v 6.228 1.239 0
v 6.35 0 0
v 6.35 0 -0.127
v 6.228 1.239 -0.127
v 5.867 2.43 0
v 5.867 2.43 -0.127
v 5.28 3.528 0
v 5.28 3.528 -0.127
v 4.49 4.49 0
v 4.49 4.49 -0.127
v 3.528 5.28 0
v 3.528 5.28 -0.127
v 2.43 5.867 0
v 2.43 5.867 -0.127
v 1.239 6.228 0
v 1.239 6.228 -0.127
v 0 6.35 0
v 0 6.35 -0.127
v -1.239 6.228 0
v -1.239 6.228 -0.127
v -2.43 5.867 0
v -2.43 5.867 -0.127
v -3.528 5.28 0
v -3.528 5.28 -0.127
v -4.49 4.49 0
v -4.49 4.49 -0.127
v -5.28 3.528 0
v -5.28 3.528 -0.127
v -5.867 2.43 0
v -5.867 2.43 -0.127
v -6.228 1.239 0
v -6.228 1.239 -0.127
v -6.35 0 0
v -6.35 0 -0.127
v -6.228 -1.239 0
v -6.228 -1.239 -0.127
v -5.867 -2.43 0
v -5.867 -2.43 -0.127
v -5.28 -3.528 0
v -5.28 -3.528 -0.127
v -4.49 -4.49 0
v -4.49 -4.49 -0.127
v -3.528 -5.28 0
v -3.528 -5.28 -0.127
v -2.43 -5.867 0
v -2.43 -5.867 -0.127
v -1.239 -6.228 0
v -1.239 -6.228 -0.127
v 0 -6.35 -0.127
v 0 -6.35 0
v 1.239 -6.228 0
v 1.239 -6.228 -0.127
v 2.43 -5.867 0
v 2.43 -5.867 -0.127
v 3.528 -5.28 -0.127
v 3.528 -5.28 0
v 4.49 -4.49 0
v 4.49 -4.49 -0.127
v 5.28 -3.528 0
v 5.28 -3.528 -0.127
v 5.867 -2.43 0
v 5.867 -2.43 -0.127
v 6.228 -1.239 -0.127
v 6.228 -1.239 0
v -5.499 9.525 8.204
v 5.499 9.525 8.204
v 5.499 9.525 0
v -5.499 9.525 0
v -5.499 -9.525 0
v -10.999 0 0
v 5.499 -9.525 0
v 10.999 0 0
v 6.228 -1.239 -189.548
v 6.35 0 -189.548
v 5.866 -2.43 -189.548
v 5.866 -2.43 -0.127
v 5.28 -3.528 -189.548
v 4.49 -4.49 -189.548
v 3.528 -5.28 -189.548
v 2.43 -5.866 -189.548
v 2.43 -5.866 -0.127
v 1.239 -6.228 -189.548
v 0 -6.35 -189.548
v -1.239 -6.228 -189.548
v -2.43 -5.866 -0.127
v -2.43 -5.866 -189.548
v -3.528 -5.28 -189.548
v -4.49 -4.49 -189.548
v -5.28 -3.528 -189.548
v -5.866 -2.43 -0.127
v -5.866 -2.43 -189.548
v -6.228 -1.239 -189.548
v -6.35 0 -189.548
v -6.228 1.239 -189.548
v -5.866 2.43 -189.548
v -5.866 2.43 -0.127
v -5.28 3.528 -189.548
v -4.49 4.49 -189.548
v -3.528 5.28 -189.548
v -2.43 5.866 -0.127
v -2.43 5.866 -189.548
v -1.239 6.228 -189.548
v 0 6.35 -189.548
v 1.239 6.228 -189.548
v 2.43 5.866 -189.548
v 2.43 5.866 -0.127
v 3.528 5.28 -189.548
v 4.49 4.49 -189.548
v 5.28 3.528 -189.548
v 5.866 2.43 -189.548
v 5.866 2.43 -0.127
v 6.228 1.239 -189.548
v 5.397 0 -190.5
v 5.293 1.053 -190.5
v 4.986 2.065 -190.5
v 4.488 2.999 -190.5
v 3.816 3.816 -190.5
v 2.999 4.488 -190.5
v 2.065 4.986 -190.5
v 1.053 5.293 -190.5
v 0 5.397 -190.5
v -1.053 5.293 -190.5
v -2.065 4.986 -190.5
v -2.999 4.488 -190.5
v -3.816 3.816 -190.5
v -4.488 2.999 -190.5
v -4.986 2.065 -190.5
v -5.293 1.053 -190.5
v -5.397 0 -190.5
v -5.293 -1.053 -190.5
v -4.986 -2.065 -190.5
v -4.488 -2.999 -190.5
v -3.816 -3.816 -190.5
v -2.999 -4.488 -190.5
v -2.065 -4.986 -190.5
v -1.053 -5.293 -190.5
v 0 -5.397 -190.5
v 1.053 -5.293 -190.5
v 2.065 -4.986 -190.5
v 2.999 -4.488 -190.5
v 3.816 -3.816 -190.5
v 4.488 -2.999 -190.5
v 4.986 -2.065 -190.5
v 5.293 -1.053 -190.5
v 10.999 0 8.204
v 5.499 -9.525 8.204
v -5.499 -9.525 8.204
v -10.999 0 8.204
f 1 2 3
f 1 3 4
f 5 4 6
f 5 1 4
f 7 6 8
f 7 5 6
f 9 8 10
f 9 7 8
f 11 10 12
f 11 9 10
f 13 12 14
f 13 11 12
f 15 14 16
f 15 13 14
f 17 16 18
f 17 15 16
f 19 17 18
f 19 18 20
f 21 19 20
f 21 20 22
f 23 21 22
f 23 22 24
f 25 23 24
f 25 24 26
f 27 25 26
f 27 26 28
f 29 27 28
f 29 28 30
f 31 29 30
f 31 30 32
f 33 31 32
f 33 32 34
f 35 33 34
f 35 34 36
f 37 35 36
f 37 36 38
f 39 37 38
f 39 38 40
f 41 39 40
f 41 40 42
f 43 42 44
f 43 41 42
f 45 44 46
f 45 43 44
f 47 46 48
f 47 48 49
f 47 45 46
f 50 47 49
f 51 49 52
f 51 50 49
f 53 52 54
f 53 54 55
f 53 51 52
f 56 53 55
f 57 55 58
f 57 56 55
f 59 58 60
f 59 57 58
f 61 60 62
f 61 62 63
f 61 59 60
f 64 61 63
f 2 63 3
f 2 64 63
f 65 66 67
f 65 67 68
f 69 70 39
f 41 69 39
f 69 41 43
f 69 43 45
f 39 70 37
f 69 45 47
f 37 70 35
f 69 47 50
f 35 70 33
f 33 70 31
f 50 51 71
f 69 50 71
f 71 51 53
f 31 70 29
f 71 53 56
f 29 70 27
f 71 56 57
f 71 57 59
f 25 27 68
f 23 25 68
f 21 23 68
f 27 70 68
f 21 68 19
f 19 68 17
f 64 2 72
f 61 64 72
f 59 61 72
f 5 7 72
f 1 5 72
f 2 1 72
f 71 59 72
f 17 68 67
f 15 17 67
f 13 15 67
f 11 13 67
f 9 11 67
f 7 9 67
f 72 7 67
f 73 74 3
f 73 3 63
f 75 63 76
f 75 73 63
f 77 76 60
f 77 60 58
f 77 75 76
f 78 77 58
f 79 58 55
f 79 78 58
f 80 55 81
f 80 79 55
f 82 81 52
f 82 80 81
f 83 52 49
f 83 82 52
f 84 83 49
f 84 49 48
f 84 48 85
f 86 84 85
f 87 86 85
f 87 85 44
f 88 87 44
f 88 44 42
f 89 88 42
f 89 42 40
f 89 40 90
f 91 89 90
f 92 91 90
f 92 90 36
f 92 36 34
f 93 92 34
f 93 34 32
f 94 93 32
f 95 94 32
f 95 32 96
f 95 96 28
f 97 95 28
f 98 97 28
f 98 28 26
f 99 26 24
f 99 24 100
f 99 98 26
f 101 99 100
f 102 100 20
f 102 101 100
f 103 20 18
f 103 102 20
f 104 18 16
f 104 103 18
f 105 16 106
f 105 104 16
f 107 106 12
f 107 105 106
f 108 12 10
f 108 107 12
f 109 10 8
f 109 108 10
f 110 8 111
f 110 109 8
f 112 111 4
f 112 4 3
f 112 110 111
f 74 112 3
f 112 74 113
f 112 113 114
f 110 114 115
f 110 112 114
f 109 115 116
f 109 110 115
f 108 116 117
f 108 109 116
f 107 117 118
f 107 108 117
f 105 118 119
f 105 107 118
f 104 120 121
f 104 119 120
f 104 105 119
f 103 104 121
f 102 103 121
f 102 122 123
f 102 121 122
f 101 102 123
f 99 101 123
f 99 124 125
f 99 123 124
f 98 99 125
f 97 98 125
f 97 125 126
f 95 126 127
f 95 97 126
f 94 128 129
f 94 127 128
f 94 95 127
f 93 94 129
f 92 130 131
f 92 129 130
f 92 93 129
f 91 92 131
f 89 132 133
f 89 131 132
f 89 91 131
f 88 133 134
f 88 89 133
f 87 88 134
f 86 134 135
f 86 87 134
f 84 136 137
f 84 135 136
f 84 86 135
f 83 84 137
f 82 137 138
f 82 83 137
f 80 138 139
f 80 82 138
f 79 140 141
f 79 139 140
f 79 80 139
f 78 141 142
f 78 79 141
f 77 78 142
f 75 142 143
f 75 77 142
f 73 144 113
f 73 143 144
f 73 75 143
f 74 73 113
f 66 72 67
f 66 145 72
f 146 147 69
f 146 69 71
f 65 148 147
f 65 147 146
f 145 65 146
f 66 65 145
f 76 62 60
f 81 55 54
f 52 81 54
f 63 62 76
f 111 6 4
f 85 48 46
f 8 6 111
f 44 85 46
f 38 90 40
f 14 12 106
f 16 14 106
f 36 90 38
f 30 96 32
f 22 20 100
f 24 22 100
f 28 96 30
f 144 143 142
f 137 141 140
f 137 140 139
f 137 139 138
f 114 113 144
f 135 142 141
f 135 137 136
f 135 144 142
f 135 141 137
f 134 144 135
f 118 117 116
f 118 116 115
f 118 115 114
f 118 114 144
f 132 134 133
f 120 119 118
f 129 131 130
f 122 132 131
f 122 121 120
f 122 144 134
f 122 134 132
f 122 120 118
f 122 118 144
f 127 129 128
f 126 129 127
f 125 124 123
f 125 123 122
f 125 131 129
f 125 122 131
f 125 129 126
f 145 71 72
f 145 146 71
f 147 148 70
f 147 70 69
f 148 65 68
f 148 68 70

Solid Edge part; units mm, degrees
sketch "Sketch1" plane through (0, 0, 0) normal (0, 0, 1) x (1, 0, 0)
  circle A0 centre (0, 0) radius 11.049
  dimension "D1" = 22.098
extrude "Protrusion1" add sketch "Sketch1" along normal blind 8.2042
sketch "Sketch2" plane through (0, 0, 0) normal (0, 0, -1) x (1, 0, 0)
  circle A0 centre (0, 0) radius 6.35
extrude "Protrusion2" add sketch "Sketch2" along normal blind 190.5
sketch "Sketch3" plane through (0, 0, -190.5) normal (0, 0, -1) x (1, 0, 0)
  circle A0 centre (0, 0) radius 6.3497
extrude "Cutout1" cut sketch "Sketch3" against normal blind 190.373 flip side to cut
chamfer "Chamfer_1" distance 0.9525 angle 45 1 edges at (-6.3497, 0, -190.5)
sketch "Sketch4" plane through (0, 0, 8.2042) normal (0, 0, 1) x (1, 0, 0)
  line L0 (-5.5995, 9.525) -> (5.5995, 9.525)
  dimension "D1" = 19.05
extrude "Cutout2" cut sketch "Sketch4" against normal up to next material side at (0, 9.575, 8.2042)
pattern_circular "Pattern1" count 6 over 360 about axis through (0, 0, 8.2042) along (0, 0, 1) of "Cutout2"
properties part number "108070"
